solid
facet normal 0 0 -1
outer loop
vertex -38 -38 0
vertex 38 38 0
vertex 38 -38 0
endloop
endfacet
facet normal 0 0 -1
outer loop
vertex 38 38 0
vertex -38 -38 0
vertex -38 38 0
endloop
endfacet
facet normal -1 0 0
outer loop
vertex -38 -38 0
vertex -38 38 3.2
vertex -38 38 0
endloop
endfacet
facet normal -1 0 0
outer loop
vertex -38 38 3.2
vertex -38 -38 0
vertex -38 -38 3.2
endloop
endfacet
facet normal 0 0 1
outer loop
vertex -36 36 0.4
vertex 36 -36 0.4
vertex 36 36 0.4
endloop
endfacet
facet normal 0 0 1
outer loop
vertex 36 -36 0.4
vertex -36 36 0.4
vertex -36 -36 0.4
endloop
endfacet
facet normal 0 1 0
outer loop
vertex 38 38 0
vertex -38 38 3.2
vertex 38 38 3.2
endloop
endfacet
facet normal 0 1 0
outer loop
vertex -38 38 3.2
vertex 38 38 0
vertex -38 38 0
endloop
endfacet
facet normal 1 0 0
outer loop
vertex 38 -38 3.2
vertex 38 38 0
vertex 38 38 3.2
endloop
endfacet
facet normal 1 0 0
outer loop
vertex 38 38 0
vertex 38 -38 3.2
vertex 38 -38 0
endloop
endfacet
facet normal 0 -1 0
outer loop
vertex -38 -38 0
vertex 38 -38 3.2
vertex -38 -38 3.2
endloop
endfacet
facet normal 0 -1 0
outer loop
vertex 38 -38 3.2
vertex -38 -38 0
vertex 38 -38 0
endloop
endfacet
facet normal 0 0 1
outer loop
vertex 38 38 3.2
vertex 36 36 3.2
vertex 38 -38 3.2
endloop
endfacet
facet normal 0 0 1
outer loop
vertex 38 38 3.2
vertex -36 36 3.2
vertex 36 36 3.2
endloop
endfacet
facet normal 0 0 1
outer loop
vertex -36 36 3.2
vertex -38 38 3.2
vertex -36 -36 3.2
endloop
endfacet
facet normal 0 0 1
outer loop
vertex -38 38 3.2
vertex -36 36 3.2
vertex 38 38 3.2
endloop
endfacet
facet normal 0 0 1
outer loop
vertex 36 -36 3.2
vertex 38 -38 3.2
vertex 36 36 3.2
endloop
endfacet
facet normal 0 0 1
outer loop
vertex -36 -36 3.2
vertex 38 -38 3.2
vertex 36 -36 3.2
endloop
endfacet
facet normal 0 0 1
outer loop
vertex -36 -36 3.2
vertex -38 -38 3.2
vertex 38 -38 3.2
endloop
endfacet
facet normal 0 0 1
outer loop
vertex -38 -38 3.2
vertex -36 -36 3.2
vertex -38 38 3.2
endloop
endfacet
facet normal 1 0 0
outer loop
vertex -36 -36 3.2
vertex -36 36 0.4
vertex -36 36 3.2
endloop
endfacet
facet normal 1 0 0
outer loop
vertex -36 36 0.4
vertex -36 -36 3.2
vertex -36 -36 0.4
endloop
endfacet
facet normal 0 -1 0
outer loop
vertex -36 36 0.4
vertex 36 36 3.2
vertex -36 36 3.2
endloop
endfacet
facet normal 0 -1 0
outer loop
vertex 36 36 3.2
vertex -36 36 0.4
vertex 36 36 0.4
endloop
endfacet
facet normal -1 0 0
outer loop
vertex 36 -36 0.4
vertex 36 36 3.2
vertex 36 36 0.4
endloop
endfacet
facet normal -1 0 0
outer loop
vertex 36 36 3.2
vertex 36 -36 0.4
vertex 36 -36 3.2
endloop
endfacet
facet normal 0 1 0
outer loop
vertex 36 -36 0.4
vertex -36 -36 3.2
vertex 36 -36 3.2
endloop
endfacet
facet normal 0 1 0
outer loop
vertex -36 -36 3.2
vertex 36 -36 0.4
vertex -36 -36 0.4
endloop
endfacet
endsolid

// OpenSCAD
// preview[view:south, tilt:top]

/* [Image] */

// Simple photos with many shades of light/dark areas work best. Don't forget to invert colors.
image_file = "/tmp/lithophane.dat";
original_size = 512;

/* [Hidden] */

// What layer height will you slice this at?  The thinner the better.
layer_height = 0.2;

// base (white) will always be 2 layers thick
min_layer_height = layer_height*2;
height = 3.2 - min_layer_height;

lithopane(72, 72, 1, 1);

module lithopane(length, width, x_scale, y_scale) {
  union() {
    translate([0, 0, min_layer_height]) 
      mirror([1, 0, 0]) 
      mirror([0, 1, 0]) 
      scale([length/original_size,width/original_size,height/256]) 
      surface(file=image_file, center=true, convexity=5);
    
    linear_extrude(height=min_layer_height) 
      square([length+4, width+4], center=true);

    linear_extrude(height=height+min_layer_height) {
  	  difference() {
          square([length+4, width+4], center=true);
          square([length, width], center=true);
  	  }
    }
  }
}
